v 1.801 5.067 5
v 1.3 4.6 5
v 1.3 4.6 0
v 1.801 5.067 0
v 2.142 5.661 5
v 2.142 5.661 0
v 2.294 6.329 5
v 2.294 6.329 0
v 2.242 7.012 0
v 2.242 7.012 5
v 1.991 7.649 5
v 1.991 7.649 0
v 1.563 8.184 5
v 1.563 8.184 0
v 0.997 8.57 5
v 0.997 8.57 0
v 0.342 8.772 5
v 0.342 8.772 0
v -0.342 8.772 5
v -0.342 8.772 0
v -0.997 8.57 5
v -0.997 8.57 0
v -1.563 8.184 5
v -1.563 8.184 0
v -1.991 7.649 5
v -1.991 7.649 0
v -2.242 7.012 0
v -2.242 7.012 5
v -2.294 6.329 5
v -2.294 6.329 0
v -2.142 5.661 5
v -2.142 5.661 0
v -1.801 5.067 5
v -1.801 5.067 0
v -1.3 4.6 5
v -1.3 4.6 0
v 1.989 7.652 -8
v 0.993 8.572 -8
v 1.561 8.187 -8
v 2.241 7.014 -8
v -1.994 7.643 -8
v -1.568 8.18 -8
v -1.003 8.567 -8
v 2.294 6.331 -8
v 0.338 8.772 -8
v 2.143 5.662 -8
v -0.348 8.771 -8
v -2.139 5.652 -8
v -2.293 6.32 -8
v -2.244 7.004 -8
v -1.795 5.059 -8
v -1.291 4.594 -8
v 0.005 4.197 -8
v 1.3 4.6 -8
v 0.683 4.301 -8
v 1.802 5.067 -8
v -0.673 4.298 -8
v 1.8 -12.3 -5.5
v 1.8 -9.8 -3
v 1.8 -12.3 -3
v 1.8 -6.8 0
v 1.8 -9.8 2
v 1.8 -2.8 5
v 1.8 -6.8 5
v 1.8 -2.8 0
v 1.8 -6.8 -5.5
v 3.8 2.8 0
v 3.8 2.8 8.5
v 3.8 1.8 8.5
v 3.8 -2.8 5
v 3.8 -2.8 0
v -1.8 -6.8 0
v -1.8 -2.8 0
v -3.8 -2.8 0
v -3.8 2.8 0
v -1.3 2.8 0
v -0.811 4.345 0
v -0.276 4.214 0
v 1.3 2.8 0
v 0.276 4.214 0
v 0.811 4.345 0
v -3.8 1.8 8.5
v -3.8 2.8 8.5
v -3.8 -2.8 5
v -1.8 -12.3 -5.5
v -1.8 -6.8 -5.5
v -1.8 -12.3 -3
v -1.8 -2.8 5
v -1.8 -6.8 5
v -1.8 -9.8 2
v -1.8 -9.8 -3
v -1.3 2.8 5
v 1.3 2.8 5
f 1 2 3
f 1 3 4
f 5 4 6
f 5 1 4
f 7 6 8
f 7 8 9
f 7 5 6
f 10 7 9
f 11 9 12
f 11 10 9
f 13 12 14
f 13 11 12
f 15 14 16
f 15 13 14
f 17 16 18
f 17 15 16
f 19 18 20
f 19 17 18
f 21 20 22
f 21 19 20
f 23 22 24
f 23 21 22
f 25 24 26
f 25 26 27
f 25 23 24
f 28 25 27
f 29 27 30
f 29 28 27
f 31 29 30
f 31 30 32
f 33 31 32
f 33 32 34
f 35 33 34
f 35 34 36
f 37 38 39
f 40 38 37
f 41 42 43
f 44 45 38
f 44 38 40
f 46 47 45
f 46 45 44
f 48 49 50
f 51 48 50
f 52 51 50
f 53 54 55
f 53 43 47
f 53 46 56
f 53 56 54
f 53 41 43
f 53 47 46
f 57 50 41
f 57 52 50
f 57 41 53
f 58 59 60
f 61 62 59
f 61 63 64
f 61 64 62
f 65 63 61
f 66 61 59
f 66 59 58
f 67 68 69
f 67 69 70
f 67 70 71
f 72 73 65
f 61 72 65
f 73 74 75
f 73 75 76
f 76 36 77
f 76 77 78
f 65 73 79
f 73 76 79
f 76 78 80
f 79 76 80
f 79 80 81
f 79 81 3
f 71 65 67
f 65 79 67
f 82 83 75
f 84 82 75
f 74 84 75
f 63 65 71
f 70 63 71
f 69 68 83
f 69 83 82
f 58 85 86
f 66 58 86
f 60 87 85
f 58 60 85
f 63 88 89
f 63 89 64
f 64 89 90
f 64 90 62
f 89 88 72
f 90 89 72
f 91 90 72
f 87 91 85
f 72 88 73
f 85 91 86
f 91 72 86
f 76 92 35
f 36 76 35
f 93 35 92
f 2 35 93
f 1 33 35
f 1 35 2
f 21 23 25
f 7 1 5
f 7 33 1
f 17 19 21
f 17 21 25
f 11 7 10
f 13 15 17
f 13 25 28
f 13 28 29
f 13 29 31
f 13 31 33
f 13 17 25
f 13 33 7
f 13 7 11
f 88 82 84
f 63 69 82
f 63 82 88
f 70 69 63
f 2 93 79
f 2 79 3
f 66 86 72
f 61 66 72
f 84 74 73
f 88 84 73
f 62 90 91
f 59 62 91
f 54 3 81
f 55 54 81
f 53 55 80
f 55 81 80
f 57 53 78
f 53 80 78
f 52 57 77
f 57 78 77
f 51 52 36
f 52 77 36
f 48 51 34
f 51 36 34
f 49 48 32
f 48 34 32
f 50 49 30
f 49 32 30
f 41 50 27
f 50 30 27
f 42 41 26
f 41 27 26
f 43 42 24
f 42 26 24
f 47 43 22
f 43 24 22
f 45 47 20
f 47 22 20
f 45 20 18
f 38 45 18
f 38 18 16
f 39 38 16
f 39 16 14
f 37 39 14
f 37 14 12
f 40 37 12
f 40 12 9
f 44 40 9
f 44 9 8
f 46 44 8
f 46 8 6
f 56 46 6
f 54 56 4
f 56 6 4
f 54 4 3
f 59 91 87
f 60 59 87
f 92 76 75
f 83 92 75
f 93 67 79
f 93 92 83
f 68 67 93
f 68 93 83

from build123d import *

# Parameters (mm, degrees)
SZKIC1_W                    = 7.6
SZKIC1_H                    = 5.6
DODANIE_WYCI_GNI_CIE1_DEPTH = 5
SZKIC2_R                    = 2.3
SZKIC2_W                    = 2.6
SZKIC2_H                    = 1.8
DODANIE_WYCI_GNI_CIE2_DEPTH = 5
SZKIC3_W                    = 3.6
SZKIC3_H                    = 7
DODANIE_WYCI_GNI_CIE3_DEPTH = 5
SZKIC4_R                    = 2.3
DODANIE_WYCI_GNI_CIE4_DEPTH = 8
SFAZOWANIE1_SIZE            = 3
DODANIE_WYCI_GNI_CIE5_DEPTH = 7.6
DODANIE_WYCI_GNI_CIE6_DEPTH = 3.6


with BuildPart() as part:
    # Szkic1 → Dodanie-wyciągnięcie1 (new body)
    with BuildSketch(Plane.XY):
        Rectangle(SZKIC1_W, SZKIC1_H)
    extrude(amount=DODANIE_WYCI_GNI_CIE1_DEPTH)

    # Szkic2 → Dodanie-wyciągnięcie2 (add)
    with BuildSketch(Plane.XY.offset(5)):
        with Locations((0, 6.497366596)):
            Circle(SZKIC2_R)
        with Locations((0, 3.7)):
            Rectangle(SZKIC2_W, SZKIC2_H)
    extrude(amount=-DODANIE_WYCI_GNI_CIE2_DEPTH)

    # Szkic3 → Dodanie-wyciągnięcie3 (add)
    with BuildSketch(Plane.XY.offset(5)):
        with Locations((0, -6.3)):
            Rectangle(SZKIC3_W, SZKIC3_H)
    extrude(amount=-DODANIE_WYCI_GNI_CIE3_DEPTH)

    # Szkic4 → Dodanie-wyciągnięcie4 (add)
    with BuildSketch(Plane(origin=(0, 0, 0), x_dir=(-1, 0, 0), z_dir=(0, 0, -1))):
        with Locations(Location((0, 6.497366596, 0), (0, 0, 235.58261129))):
            Circle(SZKIC4_R)
    extrude(amount=DODANIE_WYCI_GNI_CIE4_DEPTH)

    # Sfazowanie1
    sfazowanie1_edges = [part.edges().sort_by_distance(p)[0] for p in [
        (0, -9.8, 5),
    ]]
    chamfer(sfazowanie1_edges, length=SFAZOWANIE1_SIZE)

    # Szkic5 → Dodanie-wyciągnięcie5 (add)
    with BuildSketch(Plane(origin=(3.8, 0, 0), x_dir=(0, 0, -1), z_dir=(1, 0, 0))):
        Polygon((-5, 2.8), (-8.5, 2.8), (-8.5, 1.8), (-5, -2.8), align=None)
    extrude(amount=-DODANIE_WYCI_GNI_CIE5_DEPTH)

    # Szkic6 → Dodanie-wyciągnięcie6 (add)
    with BuildSketch(Plane.ZY.offset(1.8)):
        Polygon((0, -9.8), (-3, -9.8), (-3, -12.3), (-5.5, -12.3), (-5.5, -6.8), (0, -6.8), align=None)
    extrude(amount=-DODANIE_WYCI_GNI_CIE6_DEPTH)


solid = part.part
